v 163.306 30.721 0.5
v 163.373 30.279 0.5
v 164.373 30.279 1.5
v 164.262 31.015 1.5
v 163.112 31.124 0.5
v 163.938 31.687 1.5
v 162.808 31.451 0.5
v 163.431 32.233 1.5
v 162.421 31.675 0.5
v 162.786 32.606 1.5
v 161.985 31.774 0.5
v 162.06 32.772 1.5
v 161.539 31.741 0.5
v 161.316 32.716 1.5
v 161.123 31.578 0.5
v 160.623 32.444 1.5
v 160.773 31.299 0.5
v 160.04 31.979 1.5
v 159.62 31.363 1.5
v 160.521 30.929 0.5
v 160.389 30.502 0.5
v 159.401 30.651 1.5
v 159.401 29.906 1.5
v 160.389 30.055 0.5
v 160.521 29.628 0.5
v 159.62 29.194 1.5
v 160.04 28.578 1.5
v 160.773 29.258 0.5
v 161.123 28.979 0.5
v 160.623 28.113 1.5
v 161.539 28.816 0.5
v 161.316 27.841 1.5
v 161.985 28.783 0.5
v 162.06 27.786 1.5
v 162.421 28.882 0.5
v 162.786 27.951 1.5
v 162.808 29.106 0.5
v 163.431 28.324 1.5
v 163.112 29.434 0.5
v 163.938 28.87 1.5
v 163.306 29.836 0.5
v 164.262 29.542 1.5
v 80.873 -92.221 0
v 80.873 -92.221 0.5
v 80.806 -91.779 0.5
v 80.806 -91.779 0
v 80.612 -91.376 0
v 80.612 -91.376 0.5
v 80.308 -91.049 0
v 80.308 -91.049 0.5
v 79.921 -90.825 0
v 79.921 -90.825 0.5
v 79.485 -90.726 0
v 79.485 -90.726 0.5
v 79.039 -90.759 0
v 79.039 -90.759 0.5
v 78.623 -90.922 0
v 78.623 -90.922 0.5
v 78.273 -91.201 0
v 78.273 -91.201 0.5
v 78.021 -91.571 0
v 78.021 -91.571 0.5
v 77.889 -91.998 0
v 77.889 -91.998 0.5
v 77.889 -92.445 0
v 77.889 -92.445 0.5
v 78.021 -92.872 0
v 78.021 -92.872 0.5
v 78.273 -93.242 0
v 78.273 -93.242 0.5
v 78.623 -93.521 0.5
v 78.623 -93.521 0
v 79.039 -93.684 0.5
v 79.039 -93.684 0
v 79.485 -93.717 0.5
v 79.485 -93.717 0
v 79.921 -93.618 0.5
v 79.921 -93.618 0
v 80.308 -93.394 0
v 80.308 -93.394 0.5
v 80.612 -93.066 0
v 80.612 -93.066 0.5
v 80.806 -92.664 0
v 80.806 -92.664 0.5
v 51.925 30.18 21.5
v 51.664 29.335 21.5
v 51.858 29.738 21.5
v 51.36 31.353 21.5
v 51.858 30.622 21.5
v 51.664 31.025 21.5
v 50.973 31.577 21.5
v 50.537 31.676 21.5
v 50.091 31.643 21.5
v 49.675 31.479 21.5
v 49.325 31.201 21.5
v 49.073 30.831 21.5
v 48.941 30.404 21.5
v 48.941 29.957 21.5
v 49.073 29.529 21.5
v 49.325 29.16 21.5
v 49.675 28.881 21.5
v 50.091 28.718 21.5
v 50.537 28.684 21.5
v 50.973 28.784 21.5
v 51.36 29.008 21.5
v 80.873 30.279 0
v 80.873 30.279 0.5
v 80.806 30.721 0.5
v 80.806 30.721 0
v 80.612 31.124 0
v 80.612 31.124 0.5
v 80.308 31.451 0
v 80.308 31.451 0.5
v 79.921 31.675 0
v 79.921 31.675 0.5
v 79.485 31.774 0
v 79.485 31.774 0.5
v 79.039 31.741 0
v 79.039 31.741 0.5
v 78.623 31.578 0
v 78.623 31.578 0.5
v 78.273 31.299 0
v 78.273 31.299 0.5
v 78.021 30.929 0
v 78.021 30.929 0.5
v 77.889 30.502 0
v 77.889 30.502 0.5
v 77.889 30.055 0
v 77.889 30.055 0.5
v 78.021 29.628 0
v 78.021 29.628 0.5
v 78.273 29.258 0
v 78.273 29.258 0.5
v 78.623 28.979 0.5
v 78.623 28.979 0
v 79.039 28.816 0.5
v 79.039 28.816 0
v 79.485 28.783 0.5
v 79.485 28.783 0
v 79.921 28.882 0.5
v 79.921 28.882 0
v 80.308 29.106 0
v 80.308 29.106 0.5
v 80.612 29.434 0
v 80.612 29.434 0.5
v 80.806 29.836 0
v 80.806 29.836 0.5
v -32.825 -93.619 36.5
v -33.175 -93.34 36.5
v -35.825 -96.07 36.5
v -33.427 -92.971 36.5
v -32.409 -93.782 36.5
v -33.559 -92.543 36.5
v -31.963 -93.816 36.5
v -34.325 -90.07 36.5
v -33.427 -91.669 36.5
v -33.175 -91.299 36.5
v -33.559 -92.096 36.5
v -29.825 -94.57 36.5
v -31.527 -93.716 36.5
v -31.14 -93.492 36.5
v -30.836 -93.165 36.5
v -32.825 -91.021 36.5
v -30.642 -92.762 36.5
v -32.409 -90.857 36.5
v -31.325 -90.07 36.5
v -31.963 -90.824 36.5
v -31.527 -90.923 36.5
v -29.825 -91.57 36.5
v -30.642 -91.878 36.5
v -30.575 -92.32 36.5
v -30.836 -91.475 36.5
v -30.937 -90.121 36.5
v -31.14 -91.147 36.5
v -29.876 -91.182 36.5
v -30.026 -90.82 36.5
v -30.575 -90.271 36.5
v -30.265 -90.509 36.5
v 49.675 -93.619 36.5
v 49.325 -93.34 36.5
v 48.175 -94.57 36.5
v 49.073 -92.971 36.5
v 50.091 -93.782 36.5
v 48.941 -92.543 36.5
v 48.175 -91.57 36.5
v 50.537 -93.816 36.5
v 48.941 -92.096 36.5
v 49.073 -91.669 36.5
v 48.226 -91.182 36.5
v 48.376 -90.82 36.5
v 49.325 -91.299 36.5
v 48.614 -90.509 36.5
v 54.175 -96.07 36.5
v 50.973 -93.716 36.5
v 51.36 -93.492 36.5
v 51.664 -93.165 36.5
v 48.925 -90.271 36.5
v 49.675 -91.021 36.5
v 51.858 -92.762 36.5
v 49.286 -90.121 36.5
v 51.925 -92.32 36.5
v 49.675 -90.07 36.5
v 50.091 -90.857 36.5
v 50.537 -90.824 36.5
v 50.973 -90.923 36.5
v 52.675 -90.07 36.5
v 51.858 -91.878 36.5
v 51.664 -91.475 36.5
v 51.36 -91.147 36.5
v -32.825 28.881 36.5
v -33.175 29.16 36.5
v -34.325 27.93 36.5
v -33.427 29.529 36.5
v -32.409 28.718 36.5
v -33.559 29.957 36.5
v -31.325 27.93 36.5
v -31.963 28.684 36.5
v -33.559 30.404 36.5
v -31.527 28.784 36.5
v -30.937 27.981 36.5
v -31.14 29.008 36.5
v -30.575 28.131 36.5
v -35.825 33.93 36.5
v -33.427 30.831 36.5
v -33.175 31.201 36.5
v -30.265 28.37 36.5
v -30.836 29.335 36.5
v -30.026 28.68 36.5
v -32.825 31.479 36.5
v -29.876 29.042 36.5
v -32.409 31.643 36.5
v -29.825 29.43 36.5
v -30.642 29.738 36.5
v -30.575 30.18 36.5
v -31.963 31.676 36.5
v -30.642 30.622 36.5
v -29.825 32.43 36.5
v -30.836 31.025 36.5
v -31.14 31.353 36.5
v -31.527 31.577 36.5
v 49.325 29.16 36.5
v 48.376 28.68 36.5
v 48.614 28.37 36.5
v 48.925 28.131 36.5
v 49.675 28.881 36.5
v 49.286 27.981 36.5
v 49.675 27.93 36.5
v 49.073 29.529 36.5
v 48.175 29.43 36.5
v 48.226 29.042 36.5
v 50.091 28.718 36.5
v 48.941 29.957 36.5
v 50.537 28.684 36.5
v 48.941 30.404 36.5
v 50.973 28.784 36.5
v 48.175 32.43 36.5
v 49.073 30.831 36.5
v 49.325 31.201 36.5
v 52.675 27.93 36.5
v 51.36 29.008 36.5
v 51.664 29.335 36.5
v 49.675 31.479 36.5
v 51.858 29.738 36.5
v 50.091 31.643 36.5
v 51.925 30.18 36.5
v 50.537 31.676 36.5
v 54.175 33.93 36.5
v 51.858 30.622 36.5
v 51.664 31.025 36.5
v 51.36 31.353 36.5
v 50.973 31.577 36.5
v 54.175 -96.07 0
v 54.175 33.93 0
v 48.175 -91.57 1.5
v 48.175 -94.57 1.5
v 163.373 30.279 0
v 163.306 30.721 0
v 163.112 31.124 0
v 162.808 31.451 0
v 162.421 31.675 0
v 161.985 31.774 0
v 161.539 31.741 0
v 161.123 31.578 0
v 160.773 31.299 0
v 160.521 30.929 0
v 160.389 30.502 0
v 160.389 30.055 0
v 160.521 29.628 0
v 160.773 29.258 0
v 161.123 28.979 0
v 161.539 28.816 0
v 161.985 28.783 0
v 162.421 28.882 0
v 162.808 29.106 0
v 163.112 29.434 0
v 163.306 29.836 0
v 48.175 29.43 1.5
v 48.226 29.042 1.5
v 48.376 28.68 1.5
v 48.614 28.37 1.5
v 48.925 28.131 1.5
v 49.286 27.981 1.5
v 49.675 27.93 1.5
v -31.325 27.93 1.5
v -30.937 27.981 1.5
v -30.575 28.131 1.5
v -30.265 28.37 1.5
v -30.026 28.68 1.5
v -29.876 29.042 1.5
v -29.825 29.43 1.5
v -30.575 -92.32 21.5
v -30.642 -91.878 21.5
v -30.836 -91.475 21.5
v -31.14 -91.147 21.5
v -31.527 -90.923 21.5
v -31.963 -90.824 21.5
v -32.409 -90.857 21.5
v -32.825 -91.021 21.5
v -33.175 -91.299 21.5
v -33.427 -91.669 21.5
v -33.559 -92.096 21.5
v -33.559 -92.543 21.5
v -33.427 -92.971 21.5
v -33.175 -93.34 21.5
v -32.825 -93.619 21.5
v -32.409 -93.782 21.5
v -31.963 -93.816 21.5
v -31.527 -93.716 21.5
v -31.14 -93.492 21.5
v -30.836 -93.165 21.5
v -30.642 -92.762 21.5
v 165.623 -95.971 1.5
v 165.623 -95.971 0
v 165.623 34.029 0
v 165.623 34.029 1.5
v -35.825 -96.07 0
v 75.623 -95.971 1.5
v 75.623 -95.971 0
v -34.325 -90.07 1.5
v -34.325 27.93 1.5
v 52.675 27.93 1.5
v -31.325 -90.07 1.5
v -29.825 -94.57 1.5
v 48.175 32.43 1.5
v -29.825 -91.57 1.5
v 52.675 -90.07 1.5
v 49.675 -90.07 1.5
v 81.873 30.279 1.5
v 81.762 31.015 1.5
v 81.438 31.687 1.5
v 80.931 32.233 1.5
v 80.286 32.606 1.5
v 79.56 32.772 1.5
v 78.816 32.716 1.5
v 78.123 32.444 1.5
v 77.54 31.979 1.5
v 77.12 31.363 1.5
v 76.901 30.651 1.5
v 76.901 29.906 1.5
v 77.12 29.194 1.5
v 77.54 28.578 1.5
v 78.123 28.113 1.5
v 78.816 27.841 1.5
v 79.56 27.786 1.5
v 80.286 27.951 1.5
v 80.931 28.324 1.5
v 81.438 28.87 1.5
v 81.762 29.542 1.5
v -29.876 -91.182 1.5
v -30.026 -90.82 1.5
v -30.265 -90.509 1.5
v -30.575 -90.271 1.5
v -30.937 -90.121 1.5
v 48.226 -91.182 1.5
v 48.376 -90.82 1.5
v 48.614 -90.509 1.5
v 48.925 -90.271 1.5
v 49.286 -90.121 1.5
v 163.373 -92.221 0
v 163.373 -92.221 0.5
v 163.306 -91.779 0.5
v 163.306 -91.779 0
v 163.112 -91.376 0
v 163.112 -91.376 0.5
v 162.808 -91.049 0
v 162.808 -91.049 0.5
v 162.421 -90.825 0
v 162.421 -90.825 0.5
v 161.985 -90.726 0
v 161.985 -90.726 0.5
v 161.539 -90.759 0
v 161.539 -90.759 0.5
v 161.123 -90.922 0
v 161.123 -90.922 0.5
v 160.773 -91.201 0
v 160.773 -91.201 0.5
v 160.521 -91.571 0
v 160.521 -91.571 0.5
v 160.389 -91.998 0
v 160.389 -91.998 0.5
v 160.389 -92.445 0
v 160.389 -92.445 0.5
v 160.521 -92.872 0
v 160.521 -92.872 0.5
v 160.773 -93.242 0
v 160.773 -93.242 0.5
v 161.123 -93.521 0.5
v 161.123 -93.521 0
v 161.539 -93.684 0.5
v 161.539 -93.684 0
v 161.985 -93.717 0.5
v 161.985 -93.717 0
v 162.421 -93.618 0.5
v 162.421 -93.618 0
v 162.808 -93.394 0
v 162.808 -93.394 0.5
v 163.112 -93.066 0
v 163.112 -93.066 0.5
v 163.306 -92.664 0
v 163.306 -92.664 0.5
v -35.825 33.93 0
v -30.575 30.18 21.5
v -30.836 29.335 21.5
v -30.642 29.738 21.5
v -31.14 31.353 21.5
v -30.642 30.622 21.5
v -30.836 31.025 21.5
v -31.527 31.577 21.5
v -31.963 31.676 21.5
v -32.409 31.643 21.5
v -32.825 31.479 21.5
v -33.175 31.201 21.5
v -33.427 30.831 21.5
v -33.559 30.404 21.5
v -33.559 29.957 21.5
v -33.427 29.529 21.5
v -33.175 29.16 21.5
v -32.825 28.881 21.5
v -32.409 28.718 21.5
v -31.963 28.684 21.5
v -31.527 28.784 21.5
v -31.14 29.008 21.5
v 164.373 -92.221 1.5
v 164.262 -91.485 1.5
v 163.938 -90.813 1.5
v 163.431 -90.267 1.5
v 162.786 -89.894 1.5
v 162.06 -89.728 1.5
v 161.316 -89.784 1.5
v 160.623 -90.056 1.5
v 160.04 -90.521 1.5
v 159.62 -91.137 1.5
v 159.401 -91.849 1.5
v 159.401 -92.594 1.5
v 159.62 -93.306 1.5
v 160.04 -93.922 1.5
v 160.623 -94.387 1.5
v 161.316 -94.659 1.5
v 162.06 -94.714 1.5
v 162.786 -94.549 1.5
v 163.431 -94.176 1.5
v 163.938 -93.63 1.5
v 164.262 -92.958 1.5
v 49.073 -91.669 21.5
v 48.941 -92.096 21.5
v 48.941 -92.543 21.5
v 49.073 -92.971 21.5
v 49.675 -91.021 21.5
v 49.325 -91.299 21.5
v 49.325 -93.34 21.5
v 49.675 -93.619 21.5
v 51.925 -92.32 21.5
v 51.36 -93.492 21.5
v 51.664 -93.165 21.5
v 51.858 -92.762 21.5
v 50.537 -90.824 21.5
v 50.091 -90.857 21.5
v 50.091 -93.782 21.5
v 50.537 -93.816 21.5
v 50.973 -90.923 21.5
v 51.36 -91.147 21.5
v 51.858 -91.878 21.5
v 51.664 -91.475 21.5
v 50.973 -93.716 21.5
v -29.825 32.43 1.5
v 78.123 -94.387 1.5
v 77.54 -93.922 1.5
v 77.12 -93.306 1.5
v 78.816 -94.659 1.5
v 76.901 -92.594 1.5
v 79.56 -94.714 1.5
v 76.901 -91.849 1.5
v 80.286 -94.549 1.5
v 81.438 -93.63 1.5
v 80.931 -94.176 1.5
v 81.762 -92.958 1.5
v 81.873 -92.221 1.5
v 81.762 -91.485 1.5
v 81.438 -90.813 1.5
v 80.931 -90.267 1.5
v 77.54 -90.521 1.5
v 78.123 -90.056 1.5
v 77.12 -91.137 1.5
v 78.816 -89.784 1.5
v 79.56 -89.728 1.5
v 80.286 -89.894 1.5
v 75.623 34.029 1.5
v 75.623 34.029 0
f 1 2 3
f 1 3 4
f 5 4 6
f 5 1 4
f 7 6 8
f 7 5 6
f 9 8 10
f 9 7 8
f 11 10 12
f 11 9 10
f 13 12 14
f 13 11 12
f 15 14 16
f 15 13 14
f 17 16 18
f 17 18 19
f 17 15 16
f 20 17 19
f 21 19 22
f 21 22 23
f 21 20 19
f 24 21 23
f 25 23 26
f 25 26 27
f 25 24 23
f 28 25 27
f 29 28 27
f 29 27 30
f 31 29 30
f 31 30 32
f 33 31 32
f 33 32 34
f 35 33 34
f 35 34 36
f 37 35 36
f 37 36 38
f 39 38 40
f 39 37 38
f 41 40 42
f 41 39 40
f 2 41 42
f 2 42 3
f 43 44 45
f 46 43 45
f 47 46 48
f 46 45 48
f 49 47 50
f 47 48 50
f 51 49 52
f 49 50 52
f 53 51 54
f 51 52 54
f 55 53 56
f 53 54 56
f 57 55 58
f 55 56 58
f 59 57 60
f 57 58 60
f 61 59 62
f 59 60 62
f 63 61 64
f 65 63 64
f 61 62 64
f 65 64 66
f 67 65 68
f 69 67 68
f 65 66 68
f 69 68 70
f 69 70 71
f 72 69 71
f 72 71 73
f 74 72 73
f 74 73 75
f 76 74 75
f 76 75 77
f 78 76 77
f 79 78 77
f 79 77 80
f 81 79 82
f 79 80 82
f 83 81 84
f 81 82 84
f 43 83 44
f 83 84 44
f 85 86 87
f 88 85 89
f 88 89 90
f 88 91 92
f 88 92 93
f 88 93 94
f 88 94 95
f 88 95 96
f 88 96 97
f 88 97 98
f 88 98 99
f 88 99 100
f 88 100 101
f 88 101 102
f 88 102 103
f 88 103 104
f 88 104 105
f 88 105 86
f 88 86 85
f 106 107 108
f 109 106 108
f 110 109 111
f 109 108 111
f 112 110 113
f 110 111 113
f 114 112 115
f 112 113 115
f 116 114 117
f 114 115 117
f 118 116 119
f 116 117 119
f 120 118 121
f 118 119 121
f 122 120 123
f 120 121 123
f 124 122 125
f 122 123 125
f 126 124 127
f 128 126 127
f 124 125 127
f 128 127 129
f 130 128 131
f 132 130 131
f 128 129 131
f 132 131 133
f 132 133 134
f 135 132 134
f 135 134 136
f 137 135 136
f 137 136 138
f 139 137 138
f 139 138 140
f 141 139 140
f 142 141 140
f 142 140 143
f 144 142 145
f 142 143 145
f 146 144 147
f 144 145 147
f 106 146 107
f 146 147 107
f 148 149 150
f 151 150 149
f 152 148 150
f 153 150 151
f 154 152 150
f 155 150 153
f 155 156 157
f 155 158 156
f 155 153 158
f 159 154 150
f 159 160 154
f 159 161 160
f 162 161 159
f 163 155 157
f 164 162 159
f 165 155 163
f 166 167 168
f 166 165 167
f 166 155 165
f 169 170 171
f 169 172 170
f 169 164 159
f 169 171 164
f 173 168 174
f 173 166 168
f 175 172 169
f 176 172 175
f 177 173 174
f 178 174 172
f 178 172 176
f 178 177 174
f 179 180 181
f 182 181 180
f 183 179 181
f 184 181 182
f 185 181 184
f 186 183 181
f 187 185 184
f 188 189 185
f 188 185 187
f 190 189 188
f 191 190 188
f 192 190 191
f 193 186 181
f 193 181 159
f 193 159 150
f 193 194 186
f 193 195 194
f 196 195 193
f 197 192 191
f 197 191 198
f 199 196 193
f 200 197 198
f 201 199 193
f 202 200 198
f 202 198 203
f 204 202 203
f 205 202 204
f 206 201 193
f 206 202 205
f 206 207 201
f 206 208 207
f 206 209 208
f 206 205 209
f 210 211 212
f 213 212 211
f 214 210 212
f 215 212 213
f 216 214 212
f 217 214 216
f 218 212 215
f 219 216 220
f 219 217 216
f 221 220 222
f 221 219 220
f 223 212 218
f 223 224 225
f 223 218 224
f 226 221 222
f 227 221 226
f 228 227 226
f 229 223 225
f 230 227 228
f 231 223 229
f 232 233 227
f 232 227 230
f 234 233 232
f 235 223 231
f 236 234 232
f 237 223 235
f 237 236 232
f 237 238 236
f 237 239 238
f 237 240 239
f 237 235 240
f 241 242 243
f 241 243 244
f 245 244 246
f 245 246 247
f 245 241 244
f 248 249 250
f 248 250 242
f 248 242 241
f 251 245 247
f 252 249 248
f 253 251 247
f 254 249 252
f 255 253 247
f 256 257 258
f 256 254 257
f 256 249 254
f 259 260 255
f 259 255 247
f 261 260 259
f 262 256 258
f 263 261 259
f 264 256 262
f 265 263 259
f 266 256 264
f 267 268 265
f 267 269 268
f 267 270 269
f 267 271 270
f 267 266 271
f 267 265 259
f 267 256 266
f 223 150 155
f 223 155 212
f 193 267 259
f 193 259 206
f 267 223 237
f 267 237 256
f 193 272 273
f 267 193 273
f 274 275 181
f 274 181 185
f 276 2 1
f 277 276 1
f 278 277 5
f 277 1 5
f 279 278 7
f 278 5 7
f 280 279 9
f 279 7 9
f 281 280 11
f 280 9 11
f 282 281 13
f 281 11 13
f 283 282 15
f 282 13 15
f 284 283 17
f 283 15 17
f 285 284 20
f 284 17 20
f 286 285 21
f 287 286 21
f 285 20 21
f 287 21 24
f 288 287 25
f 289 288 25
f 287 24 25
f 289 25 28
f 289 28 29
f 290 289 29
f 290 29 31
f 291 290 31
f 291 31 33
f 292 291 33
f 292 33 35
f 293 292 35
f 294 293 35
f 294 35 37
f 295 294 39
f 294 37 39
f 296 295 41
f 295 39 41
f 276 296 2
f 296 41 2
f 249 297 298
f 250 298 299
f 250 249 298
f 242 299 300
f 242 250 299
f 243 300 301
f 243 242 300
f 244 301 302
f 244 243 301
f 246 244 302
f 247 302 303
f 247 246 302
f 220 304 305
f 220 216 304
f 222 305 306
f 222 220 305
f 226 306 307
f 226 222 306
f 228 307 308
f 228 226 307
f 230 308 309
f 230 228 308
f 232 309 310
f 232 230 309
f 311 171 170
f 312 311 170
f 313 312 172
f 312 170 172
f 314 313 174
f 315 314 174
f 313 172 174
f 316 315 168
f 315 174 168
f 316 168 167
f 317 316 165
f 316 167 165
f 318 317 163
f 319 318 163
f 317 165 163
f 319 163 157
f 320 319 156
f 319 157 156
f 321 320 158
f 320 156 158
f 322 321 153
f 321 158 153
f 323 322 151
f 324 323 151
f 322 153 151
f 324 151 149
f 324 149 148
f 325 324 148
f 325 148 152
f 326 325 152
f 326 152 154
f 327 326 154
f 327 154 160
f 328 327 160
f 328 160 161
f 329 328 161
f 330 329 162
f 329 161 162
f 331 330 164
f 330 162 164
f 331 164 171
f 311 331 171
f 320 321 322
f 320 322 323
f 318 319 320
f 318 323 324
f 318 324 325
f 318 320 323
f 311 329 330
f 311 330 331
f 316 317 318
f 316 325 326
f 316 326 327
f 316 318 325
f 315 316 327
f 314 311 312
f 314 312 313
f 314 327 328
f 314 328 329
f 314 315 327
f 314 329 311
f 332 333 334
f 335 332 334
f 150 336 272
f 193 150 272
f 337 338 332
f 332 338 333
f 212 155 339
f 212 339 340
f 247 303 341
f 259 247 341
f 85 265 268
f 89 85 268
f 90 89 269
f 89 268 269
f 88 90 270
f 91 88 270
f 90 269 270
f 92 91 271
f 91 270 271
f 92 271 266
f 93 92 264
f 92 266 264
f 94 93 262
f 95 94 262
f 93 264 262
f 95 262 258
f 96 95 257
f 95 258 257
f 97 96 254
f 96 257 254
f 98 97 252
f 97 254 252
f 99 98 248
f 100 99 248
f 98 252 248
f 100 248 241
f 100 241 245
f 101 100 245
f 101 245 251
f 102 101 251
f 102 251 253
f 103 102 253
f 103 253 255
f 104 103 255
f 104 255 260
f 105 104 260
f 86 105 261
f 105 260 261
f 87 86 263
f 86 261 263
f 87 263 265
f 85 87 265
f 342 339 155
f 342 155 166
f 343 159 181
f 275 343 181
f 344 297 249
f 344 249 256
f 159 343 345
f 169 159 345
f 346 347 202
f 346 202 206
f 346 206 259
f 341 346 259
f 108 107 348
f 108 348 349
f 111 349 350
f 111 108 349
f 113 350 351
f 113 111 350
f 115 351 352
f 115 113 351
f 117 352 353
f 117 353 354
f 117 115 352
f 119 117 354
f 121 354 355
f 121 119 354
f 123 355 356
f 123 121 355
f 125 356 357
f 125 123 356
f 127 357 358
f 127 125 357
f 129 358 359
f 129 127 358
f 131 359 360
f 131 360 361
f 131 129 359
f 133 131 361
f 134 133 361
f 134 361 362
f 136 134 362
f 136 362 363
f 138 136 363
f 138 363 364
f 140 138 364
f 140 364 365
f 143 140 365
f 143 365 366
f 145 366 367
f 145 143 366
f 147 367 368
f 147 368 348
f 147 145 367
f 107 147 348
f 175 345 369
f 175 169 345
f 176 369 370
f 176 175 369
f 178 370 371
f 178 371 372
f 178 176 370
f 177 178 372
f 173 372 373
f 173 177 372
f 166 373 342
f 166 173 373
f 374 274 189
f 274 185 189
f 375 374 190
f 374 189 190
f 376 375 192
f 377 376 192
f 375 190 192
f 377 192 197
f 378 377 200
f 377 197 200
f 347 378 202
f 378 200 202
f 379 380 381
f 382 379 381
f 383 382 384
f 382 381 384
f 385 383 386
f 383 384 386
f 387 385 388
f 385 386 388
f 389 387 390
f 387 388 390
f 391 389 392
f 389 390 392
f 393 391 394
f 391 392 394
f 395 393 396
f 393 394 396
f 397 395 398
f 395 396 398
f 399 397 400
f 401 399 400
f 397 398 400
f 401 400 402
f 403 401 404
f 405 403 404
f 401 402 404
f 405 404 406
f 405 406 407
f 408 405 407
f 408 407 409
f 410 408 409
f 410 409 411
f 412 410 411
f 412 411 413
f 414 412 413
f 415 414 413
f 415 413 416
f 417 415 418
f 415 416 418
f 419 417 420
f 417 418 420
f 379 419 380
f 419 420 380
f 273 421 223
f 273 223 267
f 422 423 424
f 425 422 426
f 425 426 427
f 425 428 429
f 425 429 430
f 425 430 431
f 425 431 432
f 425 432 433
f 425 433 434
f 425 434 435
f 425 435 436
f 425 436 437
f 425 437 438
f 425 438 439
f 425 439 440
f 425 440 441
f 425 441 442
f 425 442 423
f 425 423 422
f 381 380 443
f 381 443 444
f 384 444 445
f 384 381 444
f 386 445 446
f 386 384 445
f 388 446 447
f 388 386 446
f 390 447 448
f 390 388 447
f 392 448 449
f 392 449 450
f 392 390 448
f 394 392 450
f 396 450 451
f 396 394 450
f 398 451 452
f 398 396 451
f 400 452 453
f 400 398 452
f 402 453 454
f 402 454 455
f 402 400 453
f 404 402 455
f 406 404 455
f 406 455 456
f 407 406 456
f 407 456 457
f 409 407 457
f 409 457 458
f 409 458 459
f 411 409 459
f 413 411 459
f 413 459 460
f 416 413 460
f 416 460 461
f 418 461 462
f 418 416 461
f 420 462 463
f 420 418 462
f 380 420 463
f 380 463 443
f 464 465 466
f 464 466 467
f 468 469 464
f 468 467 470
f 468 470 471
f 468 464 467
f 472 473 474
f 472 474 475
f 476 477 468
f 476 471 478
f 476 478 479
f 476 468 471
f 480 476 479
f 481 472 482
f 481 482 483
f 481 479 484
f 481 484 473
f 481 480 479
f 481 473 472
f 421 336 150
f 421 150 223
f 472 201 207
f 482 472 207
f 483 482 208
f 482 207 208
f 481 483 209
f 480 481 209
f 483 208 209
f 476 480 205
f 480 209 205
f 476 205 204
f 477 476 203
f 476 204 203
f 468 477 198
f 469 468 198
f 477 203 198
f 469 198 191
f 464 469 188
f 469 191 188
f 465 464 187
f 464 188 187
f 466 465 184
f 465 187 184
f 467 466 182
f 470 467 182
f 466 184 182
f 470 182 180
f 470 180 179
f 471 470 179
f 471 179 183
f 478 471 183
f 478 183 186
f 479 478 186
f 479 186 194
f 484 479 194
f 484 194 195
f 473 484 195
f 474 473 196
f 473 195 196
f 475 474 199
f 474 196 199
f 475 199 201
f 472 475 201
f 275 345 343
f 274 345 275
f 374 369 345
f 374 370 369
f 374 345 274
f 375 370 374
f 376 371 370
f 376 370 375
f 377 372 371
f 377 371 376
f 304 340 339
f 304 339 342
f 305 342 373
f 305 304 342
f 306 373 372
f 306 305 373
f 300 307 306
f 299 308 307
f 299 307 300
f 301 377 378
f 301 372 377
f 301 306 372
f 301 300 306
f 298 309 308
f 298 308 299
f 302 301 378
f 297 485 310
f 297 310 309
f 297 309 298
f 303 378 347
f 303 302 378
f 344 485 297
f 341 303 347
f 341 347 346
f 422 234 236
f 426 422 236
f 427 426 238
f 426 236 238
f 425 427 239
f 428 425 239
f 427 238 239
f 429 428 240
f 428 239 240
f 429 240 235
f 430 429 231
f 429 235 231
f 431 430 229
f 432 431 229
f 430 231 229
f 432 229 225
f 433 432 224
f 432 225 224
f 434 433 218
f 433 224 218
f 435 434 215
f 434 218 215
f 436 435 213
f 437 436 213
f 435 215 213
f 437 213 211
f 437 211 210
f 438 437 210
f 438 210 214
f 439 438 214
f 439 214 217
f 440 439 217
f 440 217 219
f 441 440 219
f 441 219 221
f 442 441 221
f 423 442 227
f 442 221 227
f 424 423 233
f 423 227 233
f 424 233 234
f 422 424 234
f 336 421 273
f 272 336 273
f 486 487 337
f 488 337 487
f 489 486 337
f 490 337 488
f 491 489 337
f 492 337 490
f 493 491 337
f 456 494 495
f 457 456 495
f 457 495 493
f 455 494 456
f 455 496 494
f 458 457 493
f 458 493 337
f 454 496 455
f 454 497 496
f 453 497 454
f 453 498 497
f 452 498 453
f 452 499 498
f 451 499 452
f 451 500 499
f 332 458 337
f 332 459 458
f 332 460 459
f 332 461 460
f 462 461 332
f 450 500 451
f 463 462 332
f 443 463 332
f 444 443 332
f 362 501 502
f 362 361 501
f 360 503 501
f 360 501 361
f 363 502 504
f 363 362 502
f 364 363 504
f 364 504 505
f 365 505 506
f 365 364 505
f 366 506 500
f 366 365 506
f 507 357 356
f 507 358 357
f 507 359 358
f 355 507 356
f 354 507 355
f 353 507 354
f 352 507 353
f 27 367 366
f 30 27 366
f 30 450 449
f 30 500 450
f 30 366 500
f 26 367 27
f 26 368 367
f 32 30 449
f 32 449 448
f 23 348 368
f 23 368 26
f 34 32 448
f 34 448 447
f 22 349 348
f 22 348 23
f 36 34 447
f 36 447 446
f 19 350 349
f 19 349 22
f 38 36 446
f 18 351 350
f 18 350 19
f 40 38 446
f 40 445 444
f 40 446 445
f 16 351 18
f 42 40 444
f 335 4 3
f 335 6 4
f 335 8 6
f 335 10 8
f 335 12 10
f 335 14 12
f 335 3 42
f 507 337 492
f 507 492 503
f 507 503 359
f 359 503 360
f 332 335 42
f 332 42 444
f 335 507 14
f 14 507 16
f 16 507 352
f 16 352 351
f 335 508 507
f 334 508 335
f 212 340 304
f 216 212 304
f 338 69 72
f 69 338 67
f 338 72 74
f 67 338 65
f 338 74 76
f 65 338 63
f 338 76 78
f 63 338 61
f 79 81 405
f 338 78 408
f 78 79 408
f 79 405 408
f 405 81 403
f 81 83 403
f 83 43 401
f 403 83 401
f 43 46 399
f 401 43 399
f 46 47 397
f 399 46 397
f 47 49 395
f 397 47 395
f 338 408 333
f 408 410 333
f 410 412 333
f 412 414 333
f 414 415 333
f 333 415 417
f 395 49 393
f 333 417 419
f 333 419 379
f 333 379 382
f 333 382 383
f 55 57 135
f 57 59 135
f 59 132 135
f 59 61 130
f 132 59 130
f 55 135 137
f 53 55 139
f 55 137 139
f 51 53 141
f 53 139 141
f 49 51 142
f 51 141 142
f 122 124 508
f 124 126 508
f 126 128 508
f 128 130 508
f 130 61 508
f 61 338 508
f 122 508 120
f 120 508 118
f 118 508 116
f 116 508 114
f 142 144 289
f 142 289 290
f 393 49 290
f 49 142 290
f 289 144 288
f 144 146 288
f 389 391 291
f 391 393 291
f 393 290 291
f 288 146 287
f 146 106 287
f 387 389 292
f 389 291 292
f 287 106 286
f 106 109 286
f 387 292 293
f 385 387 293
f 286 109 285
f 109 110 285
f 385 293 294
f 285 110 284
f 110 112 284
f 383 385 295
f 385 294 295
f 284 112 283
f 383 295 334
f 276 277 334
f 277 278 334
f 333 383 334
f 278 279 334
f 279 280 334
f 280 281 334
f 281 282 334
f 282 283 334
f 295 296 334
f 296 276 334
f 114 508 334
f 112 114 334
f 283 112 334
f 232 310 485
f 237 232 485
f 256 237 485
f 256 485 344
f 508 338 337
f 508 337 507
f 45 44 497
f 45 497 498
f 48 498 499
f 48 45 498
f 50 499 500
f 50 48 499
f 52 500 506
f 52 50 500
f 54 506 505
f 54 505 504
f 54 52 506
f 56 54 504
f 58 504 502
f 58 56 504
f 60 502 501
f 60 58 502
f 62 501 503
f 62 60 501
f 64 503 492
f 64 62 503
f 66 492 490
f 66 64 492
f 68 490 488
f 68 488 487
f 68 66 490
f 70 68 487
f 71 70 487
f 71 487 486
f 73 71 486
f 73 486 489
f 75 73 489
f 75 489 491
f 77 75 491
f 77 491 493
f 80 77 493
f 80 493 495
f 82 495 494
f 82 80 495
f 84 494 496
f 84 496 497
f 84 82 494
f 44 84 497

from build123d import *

# Parameters (mm, degrees)
SKETCH_W        = 90
SKETCH_H        = 130
PAD_DEPTH       = 36.5
SKETCH001_W     = 87
SKETCH001_H     = 127
POCKET_DEPTH    = 35
SKETCH002_W     = 4.5
SKETCH002_H     = 4.5
PAD001_DEPTH    = 35
SKETCH003_R     = 1.5
POCKET001_DEPTH = 15
FILLET_R        = 1.5
FILLET001_R     = 1.5
FILLET002_R     = 1.5
FILLET003_R     = 1.5
SKETCH004_W     = 90
SKETCH004_H     = 130
PAD002_DEPTH    = 1.5
SKETCH005_R     = 1.5
POCKET002_DEPTH = 1.5
CHAMFER_SIZE    = 1
CHAMFER001_SIZE = 1
CHAMFER002_SIZE = 1
CHAMFER003_SIZE = 1


with BuildPart() as box:
    # Sketch → Pad (new body)
    with BuildSketch(Plane.XY):
        with Locations((9.174664, -31.069731)):
            Rectangle(SKETCH_W, SKETCH_H)
    extrude(amount=PAD_DEPTH)

    # Sketch001 (on Face6 of Pad) → Pocket (cut)
    with BuildSketch(Plane.XY.offset(36.5)):
        with Locations((9.174664, -31.069731)):
            Rectangle(SKETCH001_W, SKETCH001_H)
    extrude(amount=-POCKET_DEPTH, mode=Mode.SUBTRACT)

    # Sketch002 (on Face11 of Pocket) → Pad001 (join)
    with BuildSketch(Plane.XY.offset(1.5)):
        with Locations((-32.075336, -92.319731)):
            Rectangle(SKETCH002_W, SKETCH002_H)
        with Locations((50.424664, -92.319731)):
            Rectangle(SKETCH002_W, SKETCH002_H)
        with Locations((50.424664, 30.180269)):
            Rectangle(SKETCH002_W, SKETCH002_H)
        with Locations((-32.075336, 30.180269)):
            Rectangle(SKETCH002_W, SKETCH002_H)
    extrude(amount=PAD001_DEPTH)

    # Sketch003 (on Face9 of Pad001) → Pocket001 (cut)
    with BuildSketch(Plane.XY.offset(36.5)):
        with Locations((50.424664, 30.180269)):
            Circle(SKETCH003_R)
        with Locations((-32.075336, 30.180269)):
            Circle(SKETCH003_R)
        with Locations((-32.075336, -92.319731)):
            Circle(SKETCH003_R)
        with Locations((50.424664, -92.319731)):
            Circle(SKETCH003_R)
    extrude(amount=-POCKET001_DEPTH, mode=Mode.SUBTRACT)

    # Fillet
    fillet_edges = [box.edges().sort_by_distance(p)[0] for p in [
        (-29.825336, -90.069731, 19),
    ]]
    fillet(fillet_edges, radius=FILLET_R)

    # Fillet001
    fillet001_edges = [box.edges().sort_by_distance(p)[0] for p in [
        (48.174664, -90.069731, 19),
    ]]
    fillet(fillet001_edges, radius=FILLET001_R)

    # Fillet002
    fillet002_edges = [box.edges().sort_by_distance(p)[0] for p in [
        (-29.825336, 27.930269, 19),
    ]]
    fillet(fillet002_edges, radius=FILLET002_R)

    # Fillet003
    fillet003_edges = [box.edges().sort_by_distance(p)[0] for p in [
        (48.174664, 27.930269, 19),
    ]]
    fillet(fillet003_edges, radius=FILLET003_R)


with BuildPart() as lid:
    # Sketch004 → Pad002 (new body)
    with BuildSketch(Plane.XY):
        with Locations((120.622687, -30.971468)):
            Rectangle(SKETCH004_W, SKETCH004_H)
    extrude(amount=PAD002_DEPTH)

    # Sketch005 (on Face6 of Pad002) → Pocket002 (cut)
    with BuildSketch(Plane.XY.offset(1.5)):
        with Locations((79.372687, 30.278532)):
            Circle(SKETCH005_R)
        with Locations((79.372687, -92.221468)):
            Circle(SKETCH005_R)
        with Locations((161.872687, -92.221468)):
            Circle(SKETCH005_R)
        with Locations((161.872687, 30.278532)):
            Circle(SKETCH005_R)
    extrude(amount=-POCKET002_DEPTH, mode=Mode.SUBTRACT)

    # Chamfer
    chamfer_edges = [lid.edges().sort_by_distance(p)[0] for p in [
        (77.872687, -92.221468, 1.5),
    ]]
    chamfer(chamfer_edges, length=CHAMFER_SIZE)

    # Chamfer001
    chamfer001_edges = [lid.edges().sort_by_distance(p)[0] for p in [
        (160.372687, -92.221468, 1.5),
    ]]
    chamfer(chamfer001_edges, length=CHAMFER001_SIZE)

    # Chamfer002
    chamfer002_edges = [lid.edges().sort_by_distance(p)[0] for p in [
        (160.372687, 30.278532, 1.5),
    ]]
    chamfer(chamfer002_edges, length=CHAMFER002_SIZE)

    # Chamfer003
    chamfer003_edges = [lid.edges().sort_by_distance(p)[0] for p in [
        (77.872687, 30.278532, 1.5),
    ]]
    chamfer(chamfer003_edges, length=CHAMFER003_SIZE)


solid = Compound([box.part, lid.part])
